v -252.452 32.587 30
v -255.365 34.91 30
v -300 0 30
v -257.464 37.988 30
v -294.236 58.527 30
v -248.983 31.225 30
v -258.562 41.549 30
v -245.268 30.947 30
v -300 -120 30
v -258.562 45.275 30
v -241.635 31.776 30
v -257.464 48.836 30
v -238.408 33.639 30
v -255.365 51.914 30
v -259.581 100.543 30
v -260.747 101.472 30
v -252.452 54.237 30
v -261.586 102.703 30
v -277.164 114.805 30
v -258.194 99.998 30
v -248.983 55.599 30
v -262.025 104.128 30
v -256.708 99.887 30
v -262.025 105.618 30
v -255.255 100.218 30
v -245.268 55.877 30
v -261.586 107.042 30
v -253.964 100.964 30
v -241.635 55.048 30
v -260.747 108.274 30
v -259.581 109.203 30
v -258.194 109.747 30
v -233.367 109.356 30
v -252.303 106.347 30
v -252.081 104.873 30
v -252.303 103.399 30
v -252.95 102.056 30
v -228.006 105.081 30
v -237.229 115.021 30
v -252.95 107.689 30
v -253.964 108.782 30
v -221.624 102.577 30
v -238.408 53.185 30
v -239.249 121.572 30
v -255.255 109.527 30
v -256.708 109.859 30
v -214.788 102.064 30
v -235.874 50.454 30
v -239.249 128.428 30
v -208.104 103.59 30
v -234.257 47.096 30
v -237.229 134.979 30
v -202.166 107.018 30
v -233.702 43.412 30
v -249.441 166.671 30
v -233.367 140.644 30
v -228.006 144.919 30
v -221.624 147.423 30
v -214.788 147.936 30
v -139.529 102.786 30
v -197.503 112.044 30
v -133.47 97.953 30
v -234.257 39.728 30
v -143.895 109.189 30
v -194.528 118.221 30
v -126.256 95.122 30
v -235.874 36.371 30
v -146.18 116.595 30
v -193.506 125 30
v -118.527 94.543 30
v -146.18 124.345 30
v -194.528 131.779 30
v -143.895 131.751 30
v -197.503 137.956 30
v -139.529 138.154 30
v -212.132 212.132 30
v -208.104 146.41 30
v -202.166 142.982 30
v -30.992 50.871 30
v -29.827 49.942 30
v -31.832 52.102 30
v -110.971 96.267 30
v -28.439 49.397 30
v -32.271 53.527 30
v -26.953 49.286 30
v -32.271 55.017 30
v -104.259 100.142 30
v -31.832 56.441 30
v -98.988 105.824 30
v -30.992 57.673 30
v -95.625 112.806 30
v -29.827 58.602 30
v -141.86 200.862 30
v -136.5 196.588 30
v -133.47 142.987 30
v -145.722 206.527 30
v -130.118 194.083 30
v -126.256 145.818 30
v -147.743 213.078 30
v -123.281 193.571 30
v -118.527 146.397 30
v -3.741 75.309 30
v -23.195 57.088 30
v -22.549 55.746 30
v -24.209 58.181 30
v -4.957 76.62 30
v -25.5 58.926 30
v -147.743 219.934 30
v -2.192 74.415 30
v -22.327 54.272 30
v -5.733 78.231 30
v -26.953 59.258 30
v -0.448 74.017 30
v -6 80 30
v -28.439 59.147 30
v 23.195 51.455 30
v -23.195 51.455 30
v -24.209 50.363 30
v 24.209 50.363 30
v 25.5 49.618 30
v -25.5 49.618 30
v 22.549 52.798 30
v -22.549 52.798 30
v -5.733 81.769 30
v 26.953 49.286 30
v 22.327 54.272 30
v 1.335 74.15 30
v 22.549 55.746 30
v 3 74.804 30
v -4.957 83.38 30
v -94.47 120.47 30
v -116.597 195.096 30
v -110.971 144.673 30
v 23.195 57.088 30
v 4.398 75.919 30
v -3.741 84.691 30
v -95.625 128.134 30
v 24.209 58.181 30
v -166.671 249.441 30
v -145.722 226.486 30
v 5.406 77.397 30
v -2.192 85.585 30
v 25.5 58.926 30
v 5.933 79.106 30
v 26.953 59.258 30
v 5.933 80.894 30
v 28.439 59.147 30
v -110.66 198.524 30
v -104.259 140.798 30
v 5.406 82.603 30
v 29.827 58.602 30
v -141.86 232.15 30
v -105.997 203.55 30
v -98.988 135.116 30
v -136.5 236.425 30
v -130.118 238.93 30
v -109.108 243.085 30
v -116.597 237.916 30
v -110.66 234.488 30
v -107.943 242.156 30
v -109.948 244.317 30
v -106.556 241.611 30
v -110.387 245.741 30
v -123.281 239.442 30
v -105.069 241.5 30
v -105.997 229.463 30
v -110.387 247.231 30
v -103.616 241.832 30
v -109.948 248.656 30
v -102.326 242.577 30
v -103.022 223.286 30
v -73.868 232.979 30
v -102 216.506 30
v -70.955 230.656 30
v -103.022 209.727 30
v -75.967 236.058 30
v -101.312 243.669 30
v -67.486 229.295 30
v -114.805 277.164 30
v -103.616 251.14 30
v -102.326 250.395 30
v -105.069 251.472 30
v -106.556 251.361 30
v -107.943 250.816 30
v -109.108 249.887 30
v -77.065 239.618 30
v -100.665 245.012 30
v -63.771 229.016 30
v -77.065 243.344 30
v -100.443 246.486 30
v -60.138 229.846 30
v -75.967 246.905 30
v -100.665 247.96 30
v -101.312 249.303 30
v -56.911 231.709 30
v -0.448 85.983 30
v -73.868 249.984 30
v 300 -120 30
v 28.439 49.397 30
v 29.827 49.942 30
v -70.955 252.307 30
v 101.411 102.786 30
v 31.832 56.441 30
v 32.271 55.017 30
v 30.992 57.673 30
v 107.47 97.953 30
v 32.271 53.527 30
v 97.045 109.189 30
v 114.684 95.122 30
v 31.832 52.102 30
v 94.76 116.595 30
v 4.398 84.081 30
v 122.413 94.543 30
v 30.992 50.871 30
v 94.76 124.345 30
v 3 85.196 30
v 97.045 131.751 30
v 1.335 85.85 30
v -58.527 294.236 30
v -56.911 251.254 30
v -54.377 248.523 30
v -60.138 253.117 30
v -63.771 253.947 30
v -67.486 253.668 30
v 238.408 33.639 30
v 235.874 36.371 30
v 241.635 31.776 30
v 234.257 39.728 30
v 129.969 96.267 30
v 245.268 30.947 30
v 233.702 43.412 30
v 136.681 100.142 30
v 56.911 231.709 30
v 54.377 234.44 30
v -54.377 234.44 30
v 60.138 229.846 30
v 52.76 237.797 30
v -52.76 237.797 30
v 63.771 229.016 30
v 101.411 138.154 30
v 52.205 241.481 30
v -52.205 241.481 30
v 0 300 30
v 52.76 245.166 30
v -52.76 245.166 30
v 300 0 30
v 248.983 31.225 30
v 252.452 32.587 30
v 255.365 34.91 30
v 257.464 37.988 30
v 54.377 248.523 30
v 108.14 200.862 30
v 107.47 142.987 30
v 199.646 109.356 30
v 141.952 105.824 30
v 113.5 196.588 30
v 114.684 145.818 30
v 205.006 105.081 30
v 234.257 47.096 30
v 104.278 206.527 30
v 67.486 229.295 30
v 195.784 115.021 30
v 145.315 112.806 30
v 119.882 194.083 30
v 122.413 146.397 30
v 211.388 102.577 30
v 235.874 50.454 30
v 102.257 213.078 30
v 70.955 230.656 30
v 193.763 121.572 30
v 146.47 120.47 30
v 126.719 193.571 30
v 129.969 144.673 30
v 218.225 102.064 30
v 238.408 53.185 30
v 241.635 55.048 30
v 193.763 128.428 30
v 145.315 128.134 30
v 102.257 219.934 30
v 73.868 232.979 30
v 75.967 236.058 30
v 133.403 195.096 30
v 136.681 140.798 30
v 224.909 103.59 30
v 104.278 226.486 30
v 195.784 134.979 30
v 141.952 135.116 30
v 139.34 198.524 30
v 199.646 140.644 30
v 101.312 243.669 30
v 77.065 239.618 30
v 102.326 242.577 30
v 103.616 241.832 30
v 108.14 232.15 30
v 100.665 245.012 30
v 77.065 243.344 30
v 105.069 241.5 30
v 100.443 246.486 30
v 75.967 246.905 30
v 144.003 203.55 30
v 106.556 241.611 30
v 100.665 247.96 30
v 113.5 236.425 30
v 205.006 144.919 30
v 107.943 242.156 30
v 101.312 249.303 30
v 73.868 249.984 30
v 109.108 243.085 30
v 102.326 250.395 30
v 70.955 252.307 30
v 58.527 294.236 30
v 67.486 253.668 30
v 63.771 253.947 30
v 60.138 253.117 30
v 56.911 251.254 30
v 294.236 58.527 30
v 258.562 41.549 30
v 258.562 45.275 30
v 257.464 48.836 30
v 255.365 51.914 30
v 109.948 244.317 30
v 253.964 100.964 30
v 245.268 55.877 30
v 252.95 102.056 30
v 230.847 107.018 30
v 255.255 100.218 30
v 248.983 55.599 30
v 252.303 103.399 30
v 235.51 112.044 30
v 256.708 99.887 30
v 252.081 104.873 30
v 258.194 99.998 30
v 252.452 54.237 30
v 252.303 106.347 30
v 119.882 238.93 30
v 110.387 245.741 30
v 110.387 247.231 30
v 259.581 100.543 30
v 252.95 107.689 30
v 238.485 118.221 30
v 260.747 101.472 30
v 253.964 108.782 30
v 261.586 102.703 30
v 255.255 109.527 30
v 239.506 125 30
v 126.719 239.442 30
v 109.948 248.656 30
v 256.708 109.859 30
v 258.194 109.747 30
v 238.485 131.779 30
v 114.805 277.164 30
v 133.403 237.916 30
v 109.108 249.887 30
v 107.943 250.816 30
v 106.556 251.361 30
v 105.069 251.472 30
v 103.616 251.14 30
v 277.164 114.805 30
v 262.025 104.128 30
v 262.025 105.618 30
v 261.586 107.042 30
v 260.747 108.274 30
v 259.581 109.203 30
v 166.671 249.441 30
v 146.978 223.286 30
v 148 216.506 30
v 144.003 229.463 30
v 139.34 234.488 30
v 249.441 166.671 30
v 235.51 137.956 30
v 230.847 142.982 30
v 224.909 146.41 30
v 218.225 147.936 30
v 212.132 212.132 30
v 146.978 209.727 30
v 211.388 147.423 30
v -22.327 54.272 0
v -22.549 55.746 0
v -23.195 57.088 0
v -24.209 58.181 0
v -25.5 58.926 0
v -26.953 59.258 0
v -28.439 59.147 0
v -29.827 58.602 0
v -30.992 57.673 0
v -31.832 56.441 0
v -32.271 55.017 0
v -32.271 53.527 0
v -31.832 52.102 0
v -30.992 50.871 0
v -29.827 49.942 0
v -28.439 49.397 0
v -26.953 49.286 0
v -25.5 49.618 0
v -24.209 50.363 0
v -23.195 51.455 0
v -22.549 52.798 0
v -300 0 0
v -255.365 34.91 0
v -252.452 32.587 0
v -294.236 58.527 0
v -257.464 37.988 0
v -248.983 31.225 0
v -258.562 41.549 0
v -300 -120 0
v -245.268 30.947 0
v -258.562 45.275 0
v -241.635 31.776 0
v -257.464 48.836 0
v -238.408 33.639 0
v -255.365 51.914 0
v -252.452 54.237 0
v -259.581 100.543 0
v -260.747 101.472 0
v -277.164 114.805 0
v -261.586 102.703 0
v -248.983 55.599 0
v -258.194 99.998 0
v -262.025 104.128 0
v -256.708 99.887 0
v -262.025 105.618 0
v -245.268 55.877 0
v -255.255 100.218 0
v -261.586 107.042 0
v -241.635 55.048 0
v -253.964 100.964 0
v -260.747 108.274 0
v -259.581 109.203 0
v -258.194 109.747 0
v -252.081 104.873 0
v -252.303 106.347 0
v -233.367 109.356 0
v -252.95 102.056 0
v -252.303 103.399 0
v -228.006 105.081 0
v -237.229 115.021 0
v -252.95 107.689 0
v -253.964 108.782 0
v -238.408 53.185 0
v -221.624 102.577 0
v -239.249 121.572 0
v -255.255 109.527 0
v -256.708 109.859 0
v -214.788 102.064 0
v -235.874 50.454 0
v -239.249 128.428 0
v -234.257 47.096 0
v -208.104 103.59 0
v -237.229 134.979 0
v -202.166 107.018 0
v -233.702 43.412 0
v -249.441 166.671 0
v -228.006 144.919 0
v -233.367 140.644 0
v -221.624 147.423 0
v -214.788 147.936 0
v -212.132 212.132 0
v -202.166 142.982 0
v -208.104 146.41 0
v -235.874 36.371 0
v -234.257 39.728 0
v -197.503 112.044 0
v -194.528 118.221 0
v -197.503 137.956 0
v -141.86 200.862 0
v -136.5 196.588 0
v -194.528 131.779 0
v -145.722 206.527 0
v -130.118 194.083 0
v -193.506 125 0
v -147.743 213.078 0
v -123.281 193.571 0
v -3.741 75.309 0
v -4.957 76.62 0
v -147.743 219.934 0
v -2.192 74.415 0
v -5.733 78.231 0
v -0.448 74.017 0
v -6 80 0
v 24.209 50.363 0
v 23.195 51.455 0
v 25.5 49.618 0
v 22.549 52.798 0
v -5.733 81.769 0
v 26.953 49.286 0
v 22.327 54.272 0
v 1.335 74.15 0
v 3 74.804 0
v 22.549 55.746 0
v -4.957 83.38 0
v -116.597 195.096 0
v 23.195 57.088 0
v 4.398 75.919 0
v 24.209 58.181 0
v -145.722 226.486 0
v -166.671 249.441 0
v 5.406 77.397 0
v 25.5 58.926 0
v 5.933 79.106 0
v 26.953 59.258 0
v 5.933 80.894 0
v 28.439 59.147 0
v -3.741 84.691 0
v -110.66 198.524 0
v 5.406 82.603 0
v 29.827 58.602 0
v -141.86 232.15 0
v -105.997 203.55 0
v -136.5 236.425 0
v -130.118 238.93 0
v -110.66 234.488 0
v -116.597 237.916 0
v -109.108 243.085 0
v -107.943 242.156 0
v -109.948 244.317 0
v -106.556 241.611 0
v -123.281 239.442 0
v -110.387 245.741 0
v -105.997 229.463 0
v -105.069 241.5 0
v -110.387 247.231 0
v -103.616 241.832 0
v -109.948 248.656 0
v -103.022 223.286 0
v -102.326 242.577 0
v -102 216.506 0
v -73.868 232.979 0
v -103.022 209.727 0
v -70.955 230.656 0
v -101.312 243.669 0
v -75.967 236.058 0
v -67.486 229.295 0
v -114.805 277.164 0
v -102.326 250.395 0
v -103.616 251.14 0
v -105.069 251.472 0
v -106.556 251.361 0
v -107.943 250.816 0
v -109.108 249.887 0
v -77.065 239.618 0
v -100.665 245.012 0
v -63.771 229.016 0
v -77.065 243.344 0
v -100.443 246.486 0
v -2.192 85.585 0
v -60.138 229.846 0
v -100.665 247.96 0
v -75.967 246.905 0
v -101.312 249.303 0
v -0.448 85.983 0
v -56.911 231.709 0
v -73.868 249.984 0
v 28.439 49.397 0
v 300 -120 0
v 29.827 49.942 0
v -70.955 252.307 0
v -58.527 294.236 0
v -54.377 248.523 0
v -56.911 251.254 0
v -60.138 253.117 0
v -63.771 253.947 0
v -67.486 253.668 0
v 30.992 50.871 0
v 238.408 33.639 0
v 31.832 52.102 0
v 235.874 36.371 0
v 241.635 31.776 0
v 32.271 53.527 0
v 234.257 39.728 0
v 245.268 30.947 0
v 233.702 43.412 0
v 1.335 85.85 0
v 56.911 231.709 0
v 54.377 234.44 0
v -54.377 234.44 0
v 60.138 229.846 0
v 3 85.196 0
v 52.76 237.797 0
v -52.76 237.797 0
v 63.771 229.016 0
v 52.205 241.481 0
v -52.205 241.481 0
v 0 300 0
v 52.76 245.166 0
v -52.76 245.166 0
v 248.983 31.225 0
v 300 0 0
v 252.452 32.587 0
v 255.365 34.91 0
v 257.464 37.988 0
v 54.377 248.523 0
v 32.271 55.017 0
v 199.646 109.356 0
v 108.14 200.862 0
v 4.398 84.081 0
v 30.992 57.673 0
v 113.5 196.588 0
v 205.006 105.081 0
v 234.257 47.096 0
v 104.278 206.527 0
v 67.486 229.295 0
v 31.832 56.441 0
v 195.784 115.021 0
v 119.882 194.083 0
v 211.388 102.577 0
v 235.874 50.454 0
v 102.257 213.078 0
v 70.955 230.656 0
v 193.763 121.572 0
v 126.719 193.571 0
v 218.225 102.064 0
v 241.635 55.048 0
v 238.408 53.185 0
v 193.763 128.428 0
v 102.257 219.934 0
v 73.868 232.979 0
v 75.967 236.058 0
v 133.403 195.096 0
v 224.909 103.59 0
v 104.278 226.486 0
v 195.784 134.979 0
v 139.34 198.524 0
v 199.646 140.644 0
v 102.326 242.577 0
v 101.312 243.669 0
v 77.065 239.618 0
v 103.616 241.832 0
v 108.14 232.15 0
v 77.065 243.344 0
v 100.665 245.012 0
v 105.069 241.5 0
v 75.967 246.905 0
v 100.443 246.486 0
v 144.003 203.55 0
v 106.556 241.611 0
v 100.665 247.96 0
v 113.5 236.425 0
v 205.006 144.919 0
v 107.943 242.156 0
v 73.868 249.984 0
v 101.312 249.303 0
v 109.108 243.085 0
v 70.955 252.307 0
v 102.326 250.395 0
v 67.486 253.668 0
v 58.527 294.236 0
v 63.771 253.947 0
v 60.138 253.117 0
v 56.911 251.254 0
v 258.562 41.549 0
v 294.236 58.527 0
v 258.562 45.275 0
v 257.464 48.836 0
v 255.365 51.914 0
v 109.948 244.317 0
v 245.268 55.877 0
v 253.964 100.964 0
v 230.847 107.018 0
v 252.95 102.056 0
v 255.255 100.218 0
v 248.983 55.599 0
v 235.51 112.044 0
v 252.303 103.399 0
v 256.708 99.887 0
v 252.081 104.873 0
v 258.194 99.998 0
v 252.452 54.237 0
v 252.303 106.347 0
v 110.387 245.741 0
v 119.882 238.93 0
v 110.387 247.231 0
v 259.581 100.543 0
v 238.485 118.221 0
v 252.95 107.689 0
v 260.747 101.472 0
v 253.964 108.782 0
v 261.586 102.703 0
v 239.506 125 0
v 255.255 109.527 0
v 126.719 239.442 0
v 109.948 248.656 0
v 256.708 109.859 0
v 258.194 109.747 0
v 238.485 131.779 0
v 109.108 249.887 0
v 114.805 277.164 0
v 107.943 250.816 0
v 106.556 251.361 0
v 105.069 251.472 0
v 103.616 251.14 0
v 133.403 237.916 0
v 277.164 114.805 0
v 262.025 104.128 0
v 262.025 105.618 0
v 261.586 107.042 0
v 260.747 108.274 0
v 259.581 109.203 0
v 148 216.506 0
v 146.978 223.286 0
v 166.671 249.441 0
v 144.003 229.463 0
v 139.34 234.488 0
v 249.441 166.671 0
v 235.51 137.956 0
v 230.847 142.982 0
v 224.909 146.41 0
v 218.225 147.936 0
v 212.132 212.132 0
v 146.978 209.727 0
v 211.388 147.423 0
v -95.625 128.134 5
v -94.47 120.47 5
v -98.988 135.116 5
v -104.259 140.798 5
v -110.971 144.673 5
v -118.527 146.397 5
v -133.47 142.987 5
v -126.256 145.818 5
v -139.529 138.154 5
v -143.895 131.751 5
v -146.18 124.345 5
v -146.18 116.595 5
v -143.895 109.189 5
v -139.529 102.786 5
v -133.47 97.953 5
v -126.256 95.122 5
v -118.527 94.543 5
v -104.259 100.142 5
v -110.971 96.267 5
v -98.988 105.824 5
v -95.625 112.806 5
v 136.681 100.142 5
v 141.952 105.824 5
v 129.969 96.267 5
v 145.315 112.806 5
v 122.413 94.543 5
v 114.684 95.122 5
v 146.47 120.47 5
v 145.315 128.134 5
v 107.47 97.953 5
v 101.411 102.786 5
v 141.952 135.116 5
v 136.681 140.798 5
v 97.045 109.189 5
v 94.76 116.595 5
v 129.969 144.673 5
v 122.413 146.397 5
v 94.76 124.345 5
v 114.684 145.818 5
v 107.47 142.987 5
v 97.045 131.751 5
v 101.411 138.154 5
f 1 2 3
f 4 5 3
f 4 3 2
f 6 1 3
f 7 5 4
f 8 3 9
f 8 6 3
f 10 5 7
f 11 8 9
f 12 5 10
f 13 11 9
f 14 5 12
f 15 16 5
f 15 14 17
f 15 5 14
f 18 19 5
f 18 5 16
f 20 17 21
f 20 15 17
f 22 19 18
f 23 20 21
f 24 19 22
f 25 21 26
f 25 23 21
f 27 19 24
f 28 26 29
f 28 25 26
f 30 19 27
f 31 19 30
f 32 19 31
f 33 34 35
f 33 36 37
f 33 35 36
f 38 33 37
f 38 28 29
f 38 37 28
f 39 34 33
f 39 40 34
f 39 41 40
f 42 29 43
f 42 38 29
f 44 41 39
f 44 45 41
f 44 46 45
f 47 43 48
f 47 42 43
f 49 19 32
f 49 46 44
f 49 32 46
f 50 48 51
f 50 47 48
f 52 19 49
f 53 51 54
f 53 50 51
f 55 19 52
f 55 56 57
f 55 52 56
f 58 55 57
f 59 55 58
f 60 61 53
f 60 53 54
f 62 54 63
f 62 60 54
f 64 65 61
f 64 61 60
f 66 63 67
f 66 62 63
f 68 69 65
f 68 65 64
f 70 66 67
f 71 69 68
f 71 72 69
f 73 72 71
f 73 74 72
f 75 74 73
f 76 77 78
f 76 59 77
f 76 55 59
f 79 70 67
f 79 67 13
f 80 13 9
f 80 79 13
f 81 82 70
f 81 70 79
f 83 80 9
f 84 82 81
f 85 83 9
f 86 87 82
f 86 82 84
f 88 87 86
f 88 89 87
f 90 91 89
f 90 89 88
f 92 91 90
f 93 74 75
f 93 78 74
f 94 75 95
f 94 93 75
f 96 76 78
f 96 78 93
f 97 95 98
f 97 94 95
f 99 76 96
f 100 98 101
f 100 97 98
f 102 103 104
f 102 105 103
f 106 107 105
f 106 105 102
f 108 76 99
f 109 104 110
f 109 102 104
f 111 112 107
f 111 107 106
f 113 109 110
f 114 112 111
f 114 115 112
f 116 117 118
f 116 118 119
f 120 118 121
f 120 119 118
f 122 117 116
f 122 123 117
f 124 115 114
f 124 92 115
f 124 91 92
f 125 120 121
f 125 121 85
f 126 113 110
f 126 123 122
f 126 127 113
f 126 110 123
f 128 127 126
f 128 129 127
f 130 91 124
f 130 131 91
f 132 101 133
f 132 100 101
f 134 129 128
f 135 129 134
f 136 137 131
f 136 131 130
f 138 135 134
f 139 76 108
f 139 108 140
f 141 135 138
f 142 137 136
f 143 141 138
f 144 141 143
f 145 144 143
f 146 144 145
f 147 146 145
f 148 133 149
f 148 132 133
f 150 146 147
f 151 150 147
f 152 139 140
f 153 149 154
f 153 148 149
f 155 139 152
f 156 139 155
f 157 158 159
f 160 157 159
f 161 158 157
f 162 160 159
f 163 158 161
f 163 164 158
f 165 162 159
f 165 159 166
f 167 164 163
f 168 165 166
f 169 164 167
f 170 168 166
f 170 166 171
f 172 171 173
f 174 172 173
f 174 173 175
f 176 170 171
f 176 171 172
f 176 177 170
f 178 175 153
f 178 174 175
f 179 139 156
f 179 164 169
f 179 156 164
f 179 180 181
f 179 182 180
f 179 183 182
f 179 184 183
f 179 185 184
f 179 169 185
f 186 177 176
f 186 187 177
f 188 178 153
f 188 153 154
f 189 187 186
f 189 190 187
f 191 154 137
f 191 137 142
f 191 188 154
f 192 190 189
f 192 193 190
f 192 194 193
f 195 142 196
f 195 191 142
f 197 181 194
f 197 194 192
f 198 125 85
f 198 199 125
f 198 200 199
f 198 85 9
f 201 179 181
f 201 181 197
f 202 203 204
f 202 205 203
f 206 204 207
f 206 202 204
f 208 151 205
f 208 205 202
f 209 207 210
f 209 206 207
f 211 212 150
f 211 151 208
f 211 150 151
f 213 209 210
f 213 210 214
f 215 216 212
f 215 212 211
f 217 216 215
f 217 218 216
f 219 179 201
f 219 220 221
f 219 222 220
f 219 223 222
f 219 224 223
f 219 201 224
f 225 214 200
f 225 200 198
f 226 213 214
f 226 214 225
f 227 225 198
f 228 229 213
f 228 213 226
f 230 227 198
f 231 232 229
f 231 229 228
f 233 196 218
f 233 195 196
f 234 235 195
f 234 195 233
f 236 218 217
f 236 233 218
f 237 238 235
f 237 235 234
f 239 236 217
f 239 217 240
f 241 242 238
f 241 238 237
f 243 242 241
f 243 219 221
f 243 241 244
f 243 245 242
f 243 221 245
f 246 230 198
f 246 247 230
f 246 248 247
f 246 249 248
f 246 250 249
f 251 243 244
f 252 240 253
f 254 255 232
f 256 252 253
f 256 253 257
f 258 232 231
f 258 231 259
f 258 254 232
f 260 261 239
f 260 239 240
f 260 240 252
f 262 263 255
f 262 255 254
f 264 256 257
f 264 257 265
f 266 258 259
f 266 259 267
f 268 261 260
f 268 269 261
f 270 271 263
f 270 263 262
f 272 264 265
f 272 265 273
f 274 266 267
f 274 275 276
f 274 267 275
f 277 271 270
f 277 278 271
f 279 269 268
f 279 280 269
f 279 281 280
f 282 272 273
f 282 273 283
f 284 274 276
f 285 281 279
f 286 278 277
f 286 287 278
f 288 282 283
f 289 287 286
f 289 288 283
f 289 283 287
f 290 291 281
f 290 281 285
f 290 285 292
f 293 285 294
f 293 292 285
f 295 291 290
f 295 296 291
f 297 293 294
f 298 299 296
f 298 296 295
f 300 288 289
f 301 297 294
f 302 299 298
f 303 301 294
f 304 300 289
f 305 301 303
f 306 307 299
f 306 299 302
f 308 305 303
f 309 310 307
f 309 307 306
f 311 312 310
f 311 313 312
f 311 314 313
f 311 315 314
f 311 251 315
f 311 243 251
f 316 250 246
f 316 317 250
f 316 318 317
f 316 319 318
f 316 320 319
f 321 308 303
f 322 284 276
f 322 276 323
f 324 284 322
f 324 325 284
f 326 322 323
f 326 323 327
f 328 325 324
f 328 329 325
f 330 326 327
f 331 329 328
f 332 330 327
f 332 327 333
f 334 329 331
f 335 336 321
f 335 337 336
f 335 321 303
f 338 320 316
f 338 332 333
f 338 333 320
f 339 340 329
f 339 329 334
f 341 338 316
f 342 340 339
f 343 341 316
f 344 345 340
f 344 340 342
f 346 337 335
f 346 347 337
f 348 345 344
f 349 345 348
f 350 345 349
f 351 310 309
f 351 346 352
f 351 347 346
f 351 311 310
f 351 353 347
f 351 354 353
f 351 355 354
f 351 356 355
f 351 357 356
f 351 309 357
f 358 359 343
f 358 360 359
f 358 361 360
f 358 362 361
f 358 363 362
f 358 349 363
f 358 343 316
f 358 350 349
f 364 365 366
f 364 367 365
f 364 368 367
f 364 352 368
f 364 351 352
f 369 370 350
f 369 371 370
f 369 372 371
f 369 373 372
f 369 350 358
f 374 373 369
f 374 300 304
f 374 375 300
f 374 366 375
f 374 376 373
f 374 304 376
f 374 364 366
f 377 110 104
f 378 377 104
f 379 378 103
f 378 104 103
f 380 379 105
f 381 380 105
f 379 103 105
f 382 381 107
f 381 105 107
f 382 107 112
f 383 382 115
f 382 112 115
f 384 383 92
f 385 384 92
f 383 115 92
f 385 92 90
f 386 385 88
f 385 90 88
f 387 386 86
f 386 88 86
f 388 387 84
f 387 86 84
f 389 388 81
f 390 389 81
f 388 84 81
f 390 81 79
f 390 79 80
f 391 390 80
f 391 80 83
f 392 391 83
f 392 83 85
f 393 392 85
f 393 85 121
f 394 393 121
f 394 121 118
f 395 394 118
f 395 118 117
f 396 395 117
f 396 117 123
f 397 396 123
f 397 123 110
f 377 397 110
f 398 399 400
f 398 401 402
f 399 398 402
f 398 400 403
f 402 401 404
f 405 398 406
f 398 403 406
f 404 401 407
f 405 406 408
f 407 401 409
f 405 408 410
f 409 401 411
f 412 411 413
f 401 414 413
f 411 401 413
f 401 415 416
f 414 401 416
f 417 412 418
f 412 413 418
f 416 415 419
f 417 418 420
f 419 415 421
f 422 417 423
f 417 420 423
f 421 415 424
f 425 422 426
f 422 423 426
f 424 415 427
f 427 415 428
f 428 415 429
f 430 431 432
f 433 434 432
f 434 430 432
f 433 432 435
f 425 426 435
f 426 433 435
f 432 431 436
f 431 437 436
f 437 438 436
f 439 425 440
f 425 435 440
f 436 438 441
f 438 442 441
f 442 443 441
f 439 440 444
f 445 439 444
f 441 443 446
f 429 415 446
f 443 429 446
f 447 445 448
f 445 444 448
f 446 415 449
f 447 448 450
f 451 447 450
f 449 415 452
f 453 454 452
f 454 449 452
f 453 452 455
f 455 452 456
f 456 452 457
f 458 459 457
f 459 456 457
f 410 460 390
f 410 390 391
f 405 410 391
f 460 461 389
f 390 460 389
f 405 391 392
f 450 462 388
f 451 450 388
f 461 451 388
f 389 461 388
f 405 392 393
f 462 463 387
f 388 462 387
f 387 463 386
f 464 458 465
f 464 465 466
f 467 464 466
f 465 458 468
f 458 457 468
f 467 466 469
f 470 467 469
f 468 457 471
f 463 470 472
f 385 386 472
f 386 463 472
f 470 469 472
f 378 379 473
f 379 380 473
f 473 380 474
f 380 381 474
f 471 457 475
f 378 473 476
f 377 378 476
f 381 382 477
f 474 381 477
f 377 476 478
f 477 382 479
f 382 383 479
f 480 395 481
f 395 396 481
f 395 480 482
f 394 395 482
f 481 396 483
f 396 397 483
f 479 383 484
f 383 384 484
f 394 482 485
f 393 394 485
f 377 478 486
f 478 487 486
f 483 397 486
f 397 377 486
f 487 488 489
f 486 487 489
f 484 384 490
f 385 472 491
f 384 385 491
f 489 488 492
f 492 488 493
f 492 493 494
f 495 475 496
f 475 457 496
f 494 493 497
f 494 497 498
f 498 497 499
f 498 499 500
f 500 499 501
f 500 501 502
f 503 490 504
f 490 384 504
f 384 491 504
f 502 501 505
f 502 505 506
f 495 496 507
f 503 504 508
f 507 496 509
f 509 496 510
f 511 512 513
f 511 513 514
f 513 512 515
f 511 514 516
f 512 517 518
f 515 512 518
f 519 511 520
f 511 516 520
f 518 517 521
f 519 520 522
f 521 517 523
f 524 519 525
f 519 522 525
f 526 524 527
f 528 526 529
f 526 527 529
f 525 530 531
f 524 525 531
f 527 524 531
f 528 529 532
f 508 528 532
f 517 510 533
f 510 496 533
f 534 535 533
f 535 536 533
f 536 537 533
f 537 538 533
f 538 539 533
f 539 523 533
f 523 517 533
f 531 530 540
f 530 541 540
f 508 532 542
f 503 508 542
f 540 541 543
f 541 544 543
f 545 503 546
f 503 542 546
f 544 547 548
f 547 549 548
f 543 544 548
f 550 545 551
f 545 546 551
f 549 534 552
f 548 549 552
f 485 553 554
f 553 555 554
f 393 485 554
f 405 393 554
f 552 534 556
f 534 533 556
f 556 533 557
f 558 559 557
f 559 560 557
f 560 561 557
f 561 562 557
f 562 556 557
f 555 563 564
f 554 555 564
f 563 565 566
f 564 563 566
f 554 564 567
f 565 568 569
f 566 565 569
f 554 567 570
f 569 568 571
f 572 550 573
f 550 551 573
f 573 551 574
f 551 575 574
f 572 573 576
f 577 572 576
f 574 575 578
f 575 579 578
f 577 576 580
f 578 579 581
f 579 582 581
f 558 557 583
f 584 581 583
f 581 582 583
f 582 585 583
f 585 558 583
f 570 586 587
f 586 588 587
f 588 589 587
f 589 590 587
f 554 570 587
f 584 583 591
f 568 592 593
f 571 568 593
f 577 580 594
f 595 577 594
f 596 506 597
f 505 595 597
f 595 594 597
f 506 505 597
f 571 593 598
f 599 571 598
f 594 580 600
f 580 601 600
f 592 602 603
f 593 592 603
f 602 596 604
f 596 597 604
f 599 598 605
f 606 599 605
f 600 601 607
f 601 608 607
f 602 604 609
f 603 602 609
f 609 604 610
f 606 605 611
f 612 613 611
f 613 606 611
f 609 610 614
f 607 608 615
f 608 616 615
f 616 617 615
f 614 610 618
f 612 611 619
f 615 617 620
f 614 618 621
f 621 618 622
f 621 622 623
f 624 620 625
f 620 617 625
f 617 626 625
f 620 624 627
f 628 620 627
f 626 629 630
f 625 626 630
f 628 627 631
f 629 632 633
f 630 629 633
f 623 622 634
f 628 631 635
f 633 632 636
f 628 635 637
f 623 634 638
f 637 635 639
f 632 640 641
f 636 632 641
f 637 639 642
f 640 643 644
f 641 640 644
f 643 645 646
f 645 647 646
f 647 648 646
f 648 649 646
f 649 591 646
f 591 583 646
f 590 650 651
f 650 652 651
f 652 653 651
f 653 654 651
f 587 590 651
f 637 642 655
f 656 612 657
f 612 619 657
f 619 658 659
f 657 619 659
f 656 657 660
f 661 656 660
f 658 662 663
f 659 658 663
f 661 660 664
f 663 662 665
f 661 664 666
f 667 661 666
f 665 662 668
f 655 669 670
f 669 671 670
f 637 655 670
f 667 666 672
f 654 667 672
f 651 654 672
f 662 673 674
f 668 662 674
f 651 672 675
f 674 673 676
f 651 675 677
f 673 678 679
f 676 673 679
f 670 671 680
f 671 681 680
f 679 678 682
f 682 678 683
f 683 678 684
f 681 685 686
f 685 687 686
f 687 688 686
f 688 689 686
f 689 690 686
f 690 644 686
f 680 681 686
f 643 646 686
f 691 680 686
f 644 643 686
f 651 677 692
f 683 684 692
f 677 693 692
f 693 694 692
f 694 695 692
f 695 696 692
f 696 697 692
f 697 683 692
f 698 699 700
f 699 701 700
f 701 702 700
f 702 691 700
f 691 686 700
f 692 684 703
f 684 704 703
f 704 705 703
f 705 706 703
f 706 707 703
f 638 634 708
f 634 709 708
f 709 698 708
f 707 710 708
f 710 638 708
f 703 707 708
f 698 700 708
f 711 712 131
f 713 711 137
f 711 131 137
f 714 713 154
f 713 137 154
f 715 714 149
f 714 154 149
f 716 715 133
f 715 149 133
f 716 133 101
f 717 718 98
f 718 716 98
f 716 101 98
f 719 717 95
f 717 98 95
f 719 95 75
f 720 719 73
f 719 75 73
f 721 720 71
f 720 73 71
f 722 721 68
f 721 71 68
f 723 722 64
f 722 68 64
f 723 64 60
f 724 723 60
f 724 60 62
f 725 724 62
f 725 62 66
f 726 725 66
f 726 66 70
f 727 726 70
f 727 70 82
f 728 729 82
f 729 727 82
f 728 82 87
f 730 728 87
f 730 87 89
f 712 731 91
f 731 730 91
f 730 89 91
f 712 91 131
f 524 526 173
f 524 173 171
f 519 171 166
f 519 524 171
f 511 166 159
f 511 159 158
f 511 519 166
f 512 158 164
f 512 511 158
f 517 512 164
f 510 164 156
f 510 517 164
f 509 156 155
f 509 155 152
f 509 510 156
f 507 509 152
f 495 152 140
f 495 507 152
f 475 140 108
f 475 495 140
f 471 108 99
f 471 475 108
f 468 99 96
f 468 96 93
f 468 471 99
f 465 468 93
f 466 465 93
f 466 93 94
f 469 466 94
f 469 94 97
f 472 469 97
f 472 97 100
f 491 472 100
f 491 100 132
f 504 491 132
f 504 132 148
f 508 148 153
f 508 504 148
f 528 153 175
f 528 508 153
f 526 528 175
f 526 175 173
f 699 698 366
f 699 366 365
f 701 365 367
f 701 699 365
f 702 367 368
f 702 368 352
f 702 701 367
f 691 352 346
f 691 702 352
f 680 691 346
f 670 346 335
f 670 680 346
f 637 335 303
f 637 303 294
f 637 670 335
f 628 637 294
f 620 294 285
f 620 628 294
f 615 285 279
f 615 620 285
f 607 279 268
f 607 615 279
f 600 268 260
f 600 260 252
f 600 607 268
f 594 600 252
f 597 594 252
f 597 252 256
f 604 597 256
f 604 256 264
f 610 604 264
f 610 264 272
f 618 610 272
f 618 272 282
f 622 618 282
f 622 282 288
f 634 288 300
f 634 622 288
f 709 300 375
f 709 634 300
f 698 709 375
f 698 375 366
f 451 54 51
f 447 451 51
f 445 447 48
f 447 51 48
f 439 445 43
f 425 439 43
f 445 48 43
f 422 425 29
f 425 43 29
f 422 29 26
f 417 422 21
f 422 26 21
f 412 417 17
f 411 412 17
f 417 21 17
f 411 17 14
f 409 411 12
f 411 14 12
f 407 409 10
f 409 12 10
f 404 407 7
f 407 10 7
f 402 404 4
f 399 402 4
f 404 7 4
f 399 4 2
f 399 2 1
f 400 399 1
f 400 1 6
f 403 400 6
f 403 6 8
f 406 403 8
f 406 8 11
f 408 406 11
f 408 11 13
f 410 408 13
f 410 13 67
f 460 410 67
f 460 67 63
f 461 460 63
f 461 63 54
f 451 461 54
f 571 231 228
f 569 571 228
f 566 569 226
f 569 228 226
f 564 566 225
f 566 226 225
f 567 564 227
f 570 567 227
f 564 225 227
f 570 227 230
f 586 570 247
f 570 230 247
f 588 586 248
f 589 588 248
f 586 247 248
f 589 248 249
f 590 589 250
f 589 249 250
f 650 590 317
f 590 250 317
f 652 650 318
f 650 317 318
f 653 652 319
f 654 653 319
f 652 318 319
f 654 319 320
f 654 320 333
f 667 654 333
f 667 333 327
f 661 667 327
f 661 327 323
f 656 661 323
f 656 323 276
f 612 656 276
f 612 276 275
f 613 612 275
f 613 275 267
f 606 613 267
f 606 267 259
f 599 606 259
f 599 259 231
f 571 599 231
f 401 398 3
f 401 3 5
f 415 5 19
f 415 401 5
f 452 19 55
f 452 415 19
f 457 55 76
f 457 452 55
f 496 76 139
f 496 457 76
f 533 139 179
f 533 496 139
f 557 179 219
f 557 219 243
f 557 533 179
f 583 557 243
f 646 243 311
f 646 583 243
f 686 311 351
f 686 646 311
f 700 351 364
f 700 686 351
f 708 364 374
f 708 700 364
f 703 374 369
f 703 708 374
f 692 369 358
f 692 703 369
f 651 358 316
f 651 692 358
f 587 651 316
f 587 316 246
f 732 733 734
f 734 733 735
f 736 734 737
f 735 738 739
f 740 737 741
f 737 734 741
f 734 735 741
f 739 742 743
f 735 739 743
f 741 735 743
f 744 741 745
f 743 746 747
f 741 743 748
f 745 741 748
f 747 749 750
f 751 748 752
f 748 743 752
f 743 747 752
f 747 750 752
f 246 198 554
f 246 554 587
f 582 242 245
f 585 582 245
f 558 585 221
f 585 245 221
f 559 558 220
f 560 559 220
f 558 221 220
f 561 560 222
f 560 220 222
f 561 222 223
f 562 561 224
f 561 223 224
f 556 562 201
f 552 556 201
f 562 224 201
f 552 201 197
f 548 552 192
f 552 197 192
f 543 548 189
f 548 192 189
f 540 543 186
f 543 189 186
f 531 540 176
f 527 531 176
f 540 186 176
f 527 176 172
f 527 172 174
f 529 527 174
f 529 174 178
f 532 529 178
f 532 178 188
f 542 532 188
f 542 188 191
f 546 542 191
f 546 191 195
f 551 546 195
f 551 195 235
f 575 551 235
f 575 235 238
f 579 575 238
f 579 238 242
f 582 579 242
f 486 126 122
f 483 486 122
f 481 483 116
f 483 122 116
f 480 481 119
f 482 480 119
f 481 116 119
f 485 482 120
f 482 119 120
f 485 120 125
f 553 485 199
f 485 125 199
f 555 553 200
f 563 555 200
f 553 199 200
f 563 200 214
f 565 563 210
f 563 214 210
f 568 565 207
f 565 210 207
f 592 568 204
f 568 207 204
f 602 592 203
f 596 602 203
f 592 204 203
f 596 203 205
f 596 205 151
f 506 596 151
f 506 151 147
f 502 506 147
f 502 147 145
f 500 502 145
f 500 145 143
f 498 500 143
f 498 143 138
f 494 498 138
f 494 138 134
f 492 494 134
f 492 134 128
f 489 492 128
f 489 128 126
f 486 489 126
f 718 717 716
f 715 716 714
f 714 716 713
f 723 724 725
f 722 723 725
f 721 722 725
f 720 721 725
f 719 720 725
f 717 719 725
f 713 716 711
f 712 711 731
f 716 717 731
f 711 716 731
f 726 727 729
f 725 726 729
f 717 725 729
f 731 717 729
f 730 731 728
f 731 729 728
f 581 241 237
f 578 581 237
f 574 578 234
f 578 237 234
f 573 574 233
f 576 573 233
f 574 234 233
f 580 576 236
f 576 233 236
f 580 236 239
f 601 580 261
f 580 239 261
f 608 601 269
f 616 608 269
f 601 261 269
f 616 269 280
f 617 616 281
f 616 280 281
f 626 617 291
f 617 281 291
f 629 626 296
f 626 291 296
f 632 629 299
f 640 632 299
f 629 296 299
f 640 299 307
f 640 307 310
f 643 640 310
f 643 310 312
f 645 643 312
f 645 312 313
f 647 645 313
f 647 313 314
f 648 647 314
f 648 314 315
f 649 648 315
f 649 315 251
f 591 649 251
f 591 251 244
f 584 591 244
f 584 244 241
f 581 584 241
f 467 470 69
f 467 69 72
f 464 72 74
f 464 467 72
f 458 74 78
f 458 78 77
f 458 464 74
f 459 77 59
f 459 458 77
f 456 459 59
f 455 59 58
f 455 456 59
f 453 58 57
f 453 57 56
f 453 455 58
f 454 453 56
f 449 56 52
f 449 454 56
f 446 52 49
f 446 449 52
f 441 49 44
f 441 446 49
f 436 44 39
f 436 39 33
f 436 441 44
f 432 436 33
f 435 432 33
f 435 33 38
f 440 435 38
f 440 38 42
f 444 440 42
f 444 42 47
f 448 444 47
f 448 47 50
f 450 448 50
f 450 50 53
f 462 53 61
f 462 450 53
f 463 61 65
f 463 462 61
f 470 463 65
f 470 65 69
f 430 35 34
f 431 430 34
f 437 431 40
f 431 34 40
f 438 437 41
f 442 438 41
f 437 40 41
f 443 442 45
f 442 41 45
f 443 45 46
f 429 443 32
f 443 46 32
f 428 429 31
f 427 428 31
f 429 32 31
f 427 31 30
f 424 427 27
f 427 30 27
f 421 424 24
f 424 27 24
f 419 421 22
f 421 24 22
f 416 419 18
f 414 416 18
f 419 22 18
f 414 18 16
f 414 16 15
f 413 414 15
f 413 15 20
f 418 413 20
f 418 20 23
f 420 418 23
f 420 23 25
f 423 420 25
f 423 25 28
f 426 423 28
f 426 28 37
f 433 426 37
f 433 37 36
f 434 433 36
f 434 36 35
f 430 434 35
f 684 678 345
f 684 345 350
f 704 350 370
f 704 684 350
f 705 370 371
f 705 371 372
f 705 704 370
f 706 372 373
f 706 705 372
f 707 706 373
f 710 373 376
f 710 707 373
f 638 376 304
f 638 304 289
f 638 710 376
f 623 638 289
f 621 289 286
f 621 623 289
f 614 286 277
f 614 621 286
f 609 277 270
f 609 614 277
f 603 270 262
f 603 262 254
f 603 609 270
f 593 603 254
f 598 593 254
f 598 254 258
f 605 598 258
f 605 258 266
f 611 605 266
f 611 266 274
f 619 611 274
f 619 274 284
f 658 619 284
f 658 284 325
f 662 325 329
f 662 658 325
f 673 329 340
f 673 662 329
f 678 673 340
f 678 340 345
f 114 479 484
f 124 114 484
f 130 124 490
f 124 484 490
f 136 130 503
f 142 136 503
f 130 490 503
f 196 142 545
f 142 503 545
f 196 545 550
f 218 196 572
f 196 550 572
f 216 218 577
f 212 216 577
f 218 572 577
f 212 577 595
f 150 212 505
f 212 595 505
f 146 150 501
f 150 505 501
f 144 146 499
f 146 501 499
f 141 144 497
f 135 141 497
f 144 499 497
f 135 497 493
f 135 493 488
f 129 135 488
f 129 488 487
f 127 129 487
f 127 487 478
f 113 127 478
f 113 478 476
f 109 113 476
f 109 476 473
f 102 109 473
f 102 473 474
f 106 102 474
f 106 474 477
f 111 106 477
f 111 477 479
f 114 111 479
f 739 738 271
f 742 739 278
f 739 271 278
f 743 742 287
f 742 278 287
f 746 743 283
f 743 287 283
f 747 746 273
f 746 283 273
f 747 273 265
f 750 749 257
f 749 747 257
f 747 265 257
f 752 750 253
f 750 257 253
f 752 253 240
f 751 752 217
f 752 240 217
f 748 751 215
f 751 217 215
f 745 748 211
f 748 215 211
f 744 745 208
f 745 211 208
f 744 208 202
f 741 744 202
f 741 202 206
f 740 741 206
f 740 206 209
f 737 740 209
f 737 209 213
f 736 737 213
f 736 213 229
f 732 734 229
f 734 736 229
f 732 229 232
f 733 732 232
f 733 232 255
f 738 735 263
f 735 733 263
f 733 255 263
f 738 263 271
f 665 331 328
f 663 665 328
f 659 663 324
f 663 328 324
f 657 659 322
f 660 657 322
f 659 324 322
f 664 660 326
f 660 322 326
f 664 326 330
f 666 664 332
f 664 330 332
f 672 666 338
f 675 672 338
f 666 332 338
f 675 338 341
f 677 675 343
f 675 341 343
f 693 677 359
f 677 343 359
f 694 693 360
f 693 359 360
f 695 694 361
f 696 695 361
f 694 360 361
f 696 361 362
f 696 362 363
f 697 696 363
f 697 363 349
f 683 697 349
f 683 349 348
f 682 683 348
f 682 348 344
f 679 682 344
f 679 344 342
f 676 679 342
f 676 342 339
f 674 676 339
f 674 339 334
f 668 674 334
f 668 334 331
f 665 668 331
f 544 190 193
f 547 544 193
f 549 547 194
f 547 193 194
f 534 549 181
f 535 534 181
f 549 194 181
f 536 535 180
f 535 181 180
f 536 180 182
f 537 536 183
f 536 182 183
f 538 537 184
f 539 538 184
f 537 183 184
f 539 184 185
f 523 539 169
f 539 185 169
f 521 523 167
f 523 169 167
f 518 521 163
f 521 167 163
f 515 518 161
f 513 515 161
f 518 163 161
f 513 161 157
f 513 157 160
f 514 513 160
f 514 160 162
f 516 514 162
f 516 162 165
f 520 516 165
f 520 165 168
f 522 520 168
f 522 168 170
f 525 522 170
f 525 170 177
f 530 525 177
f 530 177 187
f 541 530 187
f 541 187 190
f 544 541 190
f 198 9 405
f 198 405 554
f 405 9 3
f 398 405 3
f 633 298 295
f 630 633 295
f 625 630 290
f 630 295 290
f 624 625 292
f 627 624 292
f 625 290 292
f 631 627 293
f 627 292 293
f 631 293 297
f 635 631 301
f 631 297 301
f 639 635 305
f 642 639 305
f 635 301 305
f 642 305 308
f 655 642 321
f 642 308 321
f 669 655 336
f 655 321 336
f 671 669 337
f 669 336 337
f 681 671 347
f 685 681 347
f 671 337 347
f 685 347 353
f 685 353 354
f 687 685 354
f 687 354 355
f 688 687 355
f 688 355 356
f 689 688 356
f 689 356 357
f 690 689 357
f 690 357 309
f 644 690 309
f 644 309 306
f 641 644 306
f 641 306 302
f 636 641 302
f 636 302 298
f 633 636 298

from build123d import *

# Parameters (mm, degrees)
SKETCH_1_R           = 23
EXTRUDE_1_DEPTH      = 30
CUT_EXTRUDE_1_DEPTH  = 50
SKETCH_10_R          = 12.5
CUT_EXTRUDE_6_DEPTH  = 426.323406363
SKETCH_15_R          = 5
CUT_EXTRUDE_8_DEPTH  = 426.323406363
SKETCH_16_W          = 600
SKETCH_16_H          = 120
EXTRUDE_2_DEPTH      = 30
CUT_EXTRUDE_9_REACH  = 427.323
SKETCH_17_R          = 26
EXTRUDE_START        = -5
SKETCH_18_R          = 26
EXTRUDE_3_DEPTH      = 5
SKETCH_19_R          = 6
CUT_EXTRUDE_10_DEPTH = 58


with BuildPart() as part:
    # 草图1 → 凸台-拉伸1 (new body)
    with BuildSketch(Plane.XY):
        with BuildLine():
            Line((0, 0), (-295.442325904, -52.0944533))
            ThreePointArc((-295.442325904, -52.0944533), (0, 300), (295.442325904, -52.0944533))
            Line((295.442325904, -52.0944533), (0, 0))
        make_face()
        with Locations((-125, 216.506350946)):
            Circle(SKETCH_1_R, mode=Mode.SUBTRACT)
        with Locations((-216.506350946, 125)):
            Circle(SKETCH_1_R, mode=Mode.SUBTRACT)
        with Locations((216.506350946, 125)):
            Circle(SKETCH_1_R, mode=Mode.SUBTRACT)
        with Locations((125, 216.506350946)):
            Circle(SKETCH_1_R, mode=Mode.SUBTRACT)
    extrude(amount=EXTRUDE_1_DEPTH)

    # 草图2 → 切除-拉伸1 (cut)
    with BuildSketch(Plane.XY.offset(30)):
        with BuildLine():
            Line((0, 0), (-250, 0))
            ThreePointArc((-250, 0), (0, -250), (250, 0))
            Line((250, 0), (0, 0))
        make_face()
    extrude(amount=-CUT_EXTRUDE_1_DEPTH, mode=Mode.SUBTRACT)

    # 草图10 → 切除-拉伸6 (cut, through all)
    with BuildSketch(Plane.XY.offset(30)):
        with Locations((-246.201938253, 43.412044417)):
            Circle(SKETCH_10_R)
        with Locations(Location((246.201938253, 43.412044417, 0), (0, 0, 180))):
            Circle(SKETCH_10_R)
        with Locations((-64.704761276, 241.481456572)):
            Circle(SKETCH_10_R)
        with Locations(Location((64.704761276, 241.481456572, 0), (0, 0, 180))):
            Circle(SKETCH_10_R)
    extrude(amount=-CUT_EXTRUDE_6_DEPTH, mode=Mode.SUBTRACT)

    # 草图15 → 切除-拉伸8 (cut, through all)
    with BuildSketch(Plane.XY.offset(30)):
        with Locations((-257.081286775, 104.872747053)):
            Circle(SKETCH_15_R)
        with Locations((-105.443118667, 246.486099918)):
            Circle(SKETCH_15_R)
        with Locations((-27.326692423, 54.2718973)):
            Circle(SKETCH_15_R)
        with Locations(Location((27.326692423, 54.2718973, 0), (0, 0, 180))):
            Circle(SKETCH_15_R)
        with Locations(Location((105.443118667, 246.486099918, 0), (0, 0, 180))):
            Circle(SKETCH_15_R)
        with Locations(Location((257.081286775, 104.872747053, 0), (0, 0, 180))):
            Circle(SKETCH_15_R)
    extrude(amount=-CUT_EXTRUDE_8_DEPTH, mode=Mode.SUBTRACT)

    # 草图16 → 凸台-拉伸2 (add)
    with BuildSketch(Plane.XY.offset(30)):
        with Locations((0, -60)):
            Rectangle(SKETCH_16_W, SKETCH_16_H)
    extrude(amount=-EXTRUDE_2_DEPTH)

    # 草图17 → 切除-拉伸9 (cut, up to next)
    with BuildSketch(Plane.XY.offset(30), mode=Mode.PRIVATE) as cut_extrude_9_sk1:
        with Locations((-120.47, 120.47)):
            Circle(SKETCH_17_R)
    cut_extrude_9_tool1 = extrude(cut_extrude_9_sk1.sketch, amount=-CUT_EXTRUDE_9_REACH, mode=Mode.PRIVATE) & part.part
    # 草图17 → 切除-拉伸9 (cut, up to next)
    with BuildSketch(Plane.XY.offset(30), mode=Mode.PRIVATE) as cut_extrude_9_sk2:
        with Locations((120.47, 120.47)):
            Circle(SKETCH_17_R)
    cut_extrude_9_tool2 = extrude(cut_extrude_9_sk2.sketch, amount=-CUT_EXTRUDE_9_REACH, mode=Mode.PRIVATE) & part.part
    add(cut_extrude_9_tool1.solids().sort_by_distance((-120.47, 120.47, 30))[0], mode=Mode.SUBTRACT)
    add(cut_extrude_9_tool2.solids().sort_by_distance((120.47, 120.47, 30))[0], mode=Mode.SUBTRACT)

    # 草图18 → 凸台-拉伸3 (add)
    with BuildSketch(Plane(origin=(0, 0, 0), x_dir=(-1, 0, 0), z_dir=(0, 0, -1)).offset(EXTRUDE_START)):
        with Locations(Location((120.47, 120.47, 0), (0, 0, 180))):
            Circle(SKETCH_18_R)
        with Locations((-120.47, 120.47)):
            Circle(SKETCH_18_R)
    extrude(amount=EXTRUDE_3_DEPTH)

    # 草图19 → 切除-拉伸10 (cut)
    with BuildSketch(Plane(origin=(0, 0, 0), x_dir=(-1, 0, 0), z_dir=(0, 0, -1))):
        with Locations((0, 80)):
            Circle(SKETCH_19_R)
    extrude(amount=-CUT_EXTRUDE_10_DEPTH, mode=Mode.SUBTRACT)


solid = part.part
